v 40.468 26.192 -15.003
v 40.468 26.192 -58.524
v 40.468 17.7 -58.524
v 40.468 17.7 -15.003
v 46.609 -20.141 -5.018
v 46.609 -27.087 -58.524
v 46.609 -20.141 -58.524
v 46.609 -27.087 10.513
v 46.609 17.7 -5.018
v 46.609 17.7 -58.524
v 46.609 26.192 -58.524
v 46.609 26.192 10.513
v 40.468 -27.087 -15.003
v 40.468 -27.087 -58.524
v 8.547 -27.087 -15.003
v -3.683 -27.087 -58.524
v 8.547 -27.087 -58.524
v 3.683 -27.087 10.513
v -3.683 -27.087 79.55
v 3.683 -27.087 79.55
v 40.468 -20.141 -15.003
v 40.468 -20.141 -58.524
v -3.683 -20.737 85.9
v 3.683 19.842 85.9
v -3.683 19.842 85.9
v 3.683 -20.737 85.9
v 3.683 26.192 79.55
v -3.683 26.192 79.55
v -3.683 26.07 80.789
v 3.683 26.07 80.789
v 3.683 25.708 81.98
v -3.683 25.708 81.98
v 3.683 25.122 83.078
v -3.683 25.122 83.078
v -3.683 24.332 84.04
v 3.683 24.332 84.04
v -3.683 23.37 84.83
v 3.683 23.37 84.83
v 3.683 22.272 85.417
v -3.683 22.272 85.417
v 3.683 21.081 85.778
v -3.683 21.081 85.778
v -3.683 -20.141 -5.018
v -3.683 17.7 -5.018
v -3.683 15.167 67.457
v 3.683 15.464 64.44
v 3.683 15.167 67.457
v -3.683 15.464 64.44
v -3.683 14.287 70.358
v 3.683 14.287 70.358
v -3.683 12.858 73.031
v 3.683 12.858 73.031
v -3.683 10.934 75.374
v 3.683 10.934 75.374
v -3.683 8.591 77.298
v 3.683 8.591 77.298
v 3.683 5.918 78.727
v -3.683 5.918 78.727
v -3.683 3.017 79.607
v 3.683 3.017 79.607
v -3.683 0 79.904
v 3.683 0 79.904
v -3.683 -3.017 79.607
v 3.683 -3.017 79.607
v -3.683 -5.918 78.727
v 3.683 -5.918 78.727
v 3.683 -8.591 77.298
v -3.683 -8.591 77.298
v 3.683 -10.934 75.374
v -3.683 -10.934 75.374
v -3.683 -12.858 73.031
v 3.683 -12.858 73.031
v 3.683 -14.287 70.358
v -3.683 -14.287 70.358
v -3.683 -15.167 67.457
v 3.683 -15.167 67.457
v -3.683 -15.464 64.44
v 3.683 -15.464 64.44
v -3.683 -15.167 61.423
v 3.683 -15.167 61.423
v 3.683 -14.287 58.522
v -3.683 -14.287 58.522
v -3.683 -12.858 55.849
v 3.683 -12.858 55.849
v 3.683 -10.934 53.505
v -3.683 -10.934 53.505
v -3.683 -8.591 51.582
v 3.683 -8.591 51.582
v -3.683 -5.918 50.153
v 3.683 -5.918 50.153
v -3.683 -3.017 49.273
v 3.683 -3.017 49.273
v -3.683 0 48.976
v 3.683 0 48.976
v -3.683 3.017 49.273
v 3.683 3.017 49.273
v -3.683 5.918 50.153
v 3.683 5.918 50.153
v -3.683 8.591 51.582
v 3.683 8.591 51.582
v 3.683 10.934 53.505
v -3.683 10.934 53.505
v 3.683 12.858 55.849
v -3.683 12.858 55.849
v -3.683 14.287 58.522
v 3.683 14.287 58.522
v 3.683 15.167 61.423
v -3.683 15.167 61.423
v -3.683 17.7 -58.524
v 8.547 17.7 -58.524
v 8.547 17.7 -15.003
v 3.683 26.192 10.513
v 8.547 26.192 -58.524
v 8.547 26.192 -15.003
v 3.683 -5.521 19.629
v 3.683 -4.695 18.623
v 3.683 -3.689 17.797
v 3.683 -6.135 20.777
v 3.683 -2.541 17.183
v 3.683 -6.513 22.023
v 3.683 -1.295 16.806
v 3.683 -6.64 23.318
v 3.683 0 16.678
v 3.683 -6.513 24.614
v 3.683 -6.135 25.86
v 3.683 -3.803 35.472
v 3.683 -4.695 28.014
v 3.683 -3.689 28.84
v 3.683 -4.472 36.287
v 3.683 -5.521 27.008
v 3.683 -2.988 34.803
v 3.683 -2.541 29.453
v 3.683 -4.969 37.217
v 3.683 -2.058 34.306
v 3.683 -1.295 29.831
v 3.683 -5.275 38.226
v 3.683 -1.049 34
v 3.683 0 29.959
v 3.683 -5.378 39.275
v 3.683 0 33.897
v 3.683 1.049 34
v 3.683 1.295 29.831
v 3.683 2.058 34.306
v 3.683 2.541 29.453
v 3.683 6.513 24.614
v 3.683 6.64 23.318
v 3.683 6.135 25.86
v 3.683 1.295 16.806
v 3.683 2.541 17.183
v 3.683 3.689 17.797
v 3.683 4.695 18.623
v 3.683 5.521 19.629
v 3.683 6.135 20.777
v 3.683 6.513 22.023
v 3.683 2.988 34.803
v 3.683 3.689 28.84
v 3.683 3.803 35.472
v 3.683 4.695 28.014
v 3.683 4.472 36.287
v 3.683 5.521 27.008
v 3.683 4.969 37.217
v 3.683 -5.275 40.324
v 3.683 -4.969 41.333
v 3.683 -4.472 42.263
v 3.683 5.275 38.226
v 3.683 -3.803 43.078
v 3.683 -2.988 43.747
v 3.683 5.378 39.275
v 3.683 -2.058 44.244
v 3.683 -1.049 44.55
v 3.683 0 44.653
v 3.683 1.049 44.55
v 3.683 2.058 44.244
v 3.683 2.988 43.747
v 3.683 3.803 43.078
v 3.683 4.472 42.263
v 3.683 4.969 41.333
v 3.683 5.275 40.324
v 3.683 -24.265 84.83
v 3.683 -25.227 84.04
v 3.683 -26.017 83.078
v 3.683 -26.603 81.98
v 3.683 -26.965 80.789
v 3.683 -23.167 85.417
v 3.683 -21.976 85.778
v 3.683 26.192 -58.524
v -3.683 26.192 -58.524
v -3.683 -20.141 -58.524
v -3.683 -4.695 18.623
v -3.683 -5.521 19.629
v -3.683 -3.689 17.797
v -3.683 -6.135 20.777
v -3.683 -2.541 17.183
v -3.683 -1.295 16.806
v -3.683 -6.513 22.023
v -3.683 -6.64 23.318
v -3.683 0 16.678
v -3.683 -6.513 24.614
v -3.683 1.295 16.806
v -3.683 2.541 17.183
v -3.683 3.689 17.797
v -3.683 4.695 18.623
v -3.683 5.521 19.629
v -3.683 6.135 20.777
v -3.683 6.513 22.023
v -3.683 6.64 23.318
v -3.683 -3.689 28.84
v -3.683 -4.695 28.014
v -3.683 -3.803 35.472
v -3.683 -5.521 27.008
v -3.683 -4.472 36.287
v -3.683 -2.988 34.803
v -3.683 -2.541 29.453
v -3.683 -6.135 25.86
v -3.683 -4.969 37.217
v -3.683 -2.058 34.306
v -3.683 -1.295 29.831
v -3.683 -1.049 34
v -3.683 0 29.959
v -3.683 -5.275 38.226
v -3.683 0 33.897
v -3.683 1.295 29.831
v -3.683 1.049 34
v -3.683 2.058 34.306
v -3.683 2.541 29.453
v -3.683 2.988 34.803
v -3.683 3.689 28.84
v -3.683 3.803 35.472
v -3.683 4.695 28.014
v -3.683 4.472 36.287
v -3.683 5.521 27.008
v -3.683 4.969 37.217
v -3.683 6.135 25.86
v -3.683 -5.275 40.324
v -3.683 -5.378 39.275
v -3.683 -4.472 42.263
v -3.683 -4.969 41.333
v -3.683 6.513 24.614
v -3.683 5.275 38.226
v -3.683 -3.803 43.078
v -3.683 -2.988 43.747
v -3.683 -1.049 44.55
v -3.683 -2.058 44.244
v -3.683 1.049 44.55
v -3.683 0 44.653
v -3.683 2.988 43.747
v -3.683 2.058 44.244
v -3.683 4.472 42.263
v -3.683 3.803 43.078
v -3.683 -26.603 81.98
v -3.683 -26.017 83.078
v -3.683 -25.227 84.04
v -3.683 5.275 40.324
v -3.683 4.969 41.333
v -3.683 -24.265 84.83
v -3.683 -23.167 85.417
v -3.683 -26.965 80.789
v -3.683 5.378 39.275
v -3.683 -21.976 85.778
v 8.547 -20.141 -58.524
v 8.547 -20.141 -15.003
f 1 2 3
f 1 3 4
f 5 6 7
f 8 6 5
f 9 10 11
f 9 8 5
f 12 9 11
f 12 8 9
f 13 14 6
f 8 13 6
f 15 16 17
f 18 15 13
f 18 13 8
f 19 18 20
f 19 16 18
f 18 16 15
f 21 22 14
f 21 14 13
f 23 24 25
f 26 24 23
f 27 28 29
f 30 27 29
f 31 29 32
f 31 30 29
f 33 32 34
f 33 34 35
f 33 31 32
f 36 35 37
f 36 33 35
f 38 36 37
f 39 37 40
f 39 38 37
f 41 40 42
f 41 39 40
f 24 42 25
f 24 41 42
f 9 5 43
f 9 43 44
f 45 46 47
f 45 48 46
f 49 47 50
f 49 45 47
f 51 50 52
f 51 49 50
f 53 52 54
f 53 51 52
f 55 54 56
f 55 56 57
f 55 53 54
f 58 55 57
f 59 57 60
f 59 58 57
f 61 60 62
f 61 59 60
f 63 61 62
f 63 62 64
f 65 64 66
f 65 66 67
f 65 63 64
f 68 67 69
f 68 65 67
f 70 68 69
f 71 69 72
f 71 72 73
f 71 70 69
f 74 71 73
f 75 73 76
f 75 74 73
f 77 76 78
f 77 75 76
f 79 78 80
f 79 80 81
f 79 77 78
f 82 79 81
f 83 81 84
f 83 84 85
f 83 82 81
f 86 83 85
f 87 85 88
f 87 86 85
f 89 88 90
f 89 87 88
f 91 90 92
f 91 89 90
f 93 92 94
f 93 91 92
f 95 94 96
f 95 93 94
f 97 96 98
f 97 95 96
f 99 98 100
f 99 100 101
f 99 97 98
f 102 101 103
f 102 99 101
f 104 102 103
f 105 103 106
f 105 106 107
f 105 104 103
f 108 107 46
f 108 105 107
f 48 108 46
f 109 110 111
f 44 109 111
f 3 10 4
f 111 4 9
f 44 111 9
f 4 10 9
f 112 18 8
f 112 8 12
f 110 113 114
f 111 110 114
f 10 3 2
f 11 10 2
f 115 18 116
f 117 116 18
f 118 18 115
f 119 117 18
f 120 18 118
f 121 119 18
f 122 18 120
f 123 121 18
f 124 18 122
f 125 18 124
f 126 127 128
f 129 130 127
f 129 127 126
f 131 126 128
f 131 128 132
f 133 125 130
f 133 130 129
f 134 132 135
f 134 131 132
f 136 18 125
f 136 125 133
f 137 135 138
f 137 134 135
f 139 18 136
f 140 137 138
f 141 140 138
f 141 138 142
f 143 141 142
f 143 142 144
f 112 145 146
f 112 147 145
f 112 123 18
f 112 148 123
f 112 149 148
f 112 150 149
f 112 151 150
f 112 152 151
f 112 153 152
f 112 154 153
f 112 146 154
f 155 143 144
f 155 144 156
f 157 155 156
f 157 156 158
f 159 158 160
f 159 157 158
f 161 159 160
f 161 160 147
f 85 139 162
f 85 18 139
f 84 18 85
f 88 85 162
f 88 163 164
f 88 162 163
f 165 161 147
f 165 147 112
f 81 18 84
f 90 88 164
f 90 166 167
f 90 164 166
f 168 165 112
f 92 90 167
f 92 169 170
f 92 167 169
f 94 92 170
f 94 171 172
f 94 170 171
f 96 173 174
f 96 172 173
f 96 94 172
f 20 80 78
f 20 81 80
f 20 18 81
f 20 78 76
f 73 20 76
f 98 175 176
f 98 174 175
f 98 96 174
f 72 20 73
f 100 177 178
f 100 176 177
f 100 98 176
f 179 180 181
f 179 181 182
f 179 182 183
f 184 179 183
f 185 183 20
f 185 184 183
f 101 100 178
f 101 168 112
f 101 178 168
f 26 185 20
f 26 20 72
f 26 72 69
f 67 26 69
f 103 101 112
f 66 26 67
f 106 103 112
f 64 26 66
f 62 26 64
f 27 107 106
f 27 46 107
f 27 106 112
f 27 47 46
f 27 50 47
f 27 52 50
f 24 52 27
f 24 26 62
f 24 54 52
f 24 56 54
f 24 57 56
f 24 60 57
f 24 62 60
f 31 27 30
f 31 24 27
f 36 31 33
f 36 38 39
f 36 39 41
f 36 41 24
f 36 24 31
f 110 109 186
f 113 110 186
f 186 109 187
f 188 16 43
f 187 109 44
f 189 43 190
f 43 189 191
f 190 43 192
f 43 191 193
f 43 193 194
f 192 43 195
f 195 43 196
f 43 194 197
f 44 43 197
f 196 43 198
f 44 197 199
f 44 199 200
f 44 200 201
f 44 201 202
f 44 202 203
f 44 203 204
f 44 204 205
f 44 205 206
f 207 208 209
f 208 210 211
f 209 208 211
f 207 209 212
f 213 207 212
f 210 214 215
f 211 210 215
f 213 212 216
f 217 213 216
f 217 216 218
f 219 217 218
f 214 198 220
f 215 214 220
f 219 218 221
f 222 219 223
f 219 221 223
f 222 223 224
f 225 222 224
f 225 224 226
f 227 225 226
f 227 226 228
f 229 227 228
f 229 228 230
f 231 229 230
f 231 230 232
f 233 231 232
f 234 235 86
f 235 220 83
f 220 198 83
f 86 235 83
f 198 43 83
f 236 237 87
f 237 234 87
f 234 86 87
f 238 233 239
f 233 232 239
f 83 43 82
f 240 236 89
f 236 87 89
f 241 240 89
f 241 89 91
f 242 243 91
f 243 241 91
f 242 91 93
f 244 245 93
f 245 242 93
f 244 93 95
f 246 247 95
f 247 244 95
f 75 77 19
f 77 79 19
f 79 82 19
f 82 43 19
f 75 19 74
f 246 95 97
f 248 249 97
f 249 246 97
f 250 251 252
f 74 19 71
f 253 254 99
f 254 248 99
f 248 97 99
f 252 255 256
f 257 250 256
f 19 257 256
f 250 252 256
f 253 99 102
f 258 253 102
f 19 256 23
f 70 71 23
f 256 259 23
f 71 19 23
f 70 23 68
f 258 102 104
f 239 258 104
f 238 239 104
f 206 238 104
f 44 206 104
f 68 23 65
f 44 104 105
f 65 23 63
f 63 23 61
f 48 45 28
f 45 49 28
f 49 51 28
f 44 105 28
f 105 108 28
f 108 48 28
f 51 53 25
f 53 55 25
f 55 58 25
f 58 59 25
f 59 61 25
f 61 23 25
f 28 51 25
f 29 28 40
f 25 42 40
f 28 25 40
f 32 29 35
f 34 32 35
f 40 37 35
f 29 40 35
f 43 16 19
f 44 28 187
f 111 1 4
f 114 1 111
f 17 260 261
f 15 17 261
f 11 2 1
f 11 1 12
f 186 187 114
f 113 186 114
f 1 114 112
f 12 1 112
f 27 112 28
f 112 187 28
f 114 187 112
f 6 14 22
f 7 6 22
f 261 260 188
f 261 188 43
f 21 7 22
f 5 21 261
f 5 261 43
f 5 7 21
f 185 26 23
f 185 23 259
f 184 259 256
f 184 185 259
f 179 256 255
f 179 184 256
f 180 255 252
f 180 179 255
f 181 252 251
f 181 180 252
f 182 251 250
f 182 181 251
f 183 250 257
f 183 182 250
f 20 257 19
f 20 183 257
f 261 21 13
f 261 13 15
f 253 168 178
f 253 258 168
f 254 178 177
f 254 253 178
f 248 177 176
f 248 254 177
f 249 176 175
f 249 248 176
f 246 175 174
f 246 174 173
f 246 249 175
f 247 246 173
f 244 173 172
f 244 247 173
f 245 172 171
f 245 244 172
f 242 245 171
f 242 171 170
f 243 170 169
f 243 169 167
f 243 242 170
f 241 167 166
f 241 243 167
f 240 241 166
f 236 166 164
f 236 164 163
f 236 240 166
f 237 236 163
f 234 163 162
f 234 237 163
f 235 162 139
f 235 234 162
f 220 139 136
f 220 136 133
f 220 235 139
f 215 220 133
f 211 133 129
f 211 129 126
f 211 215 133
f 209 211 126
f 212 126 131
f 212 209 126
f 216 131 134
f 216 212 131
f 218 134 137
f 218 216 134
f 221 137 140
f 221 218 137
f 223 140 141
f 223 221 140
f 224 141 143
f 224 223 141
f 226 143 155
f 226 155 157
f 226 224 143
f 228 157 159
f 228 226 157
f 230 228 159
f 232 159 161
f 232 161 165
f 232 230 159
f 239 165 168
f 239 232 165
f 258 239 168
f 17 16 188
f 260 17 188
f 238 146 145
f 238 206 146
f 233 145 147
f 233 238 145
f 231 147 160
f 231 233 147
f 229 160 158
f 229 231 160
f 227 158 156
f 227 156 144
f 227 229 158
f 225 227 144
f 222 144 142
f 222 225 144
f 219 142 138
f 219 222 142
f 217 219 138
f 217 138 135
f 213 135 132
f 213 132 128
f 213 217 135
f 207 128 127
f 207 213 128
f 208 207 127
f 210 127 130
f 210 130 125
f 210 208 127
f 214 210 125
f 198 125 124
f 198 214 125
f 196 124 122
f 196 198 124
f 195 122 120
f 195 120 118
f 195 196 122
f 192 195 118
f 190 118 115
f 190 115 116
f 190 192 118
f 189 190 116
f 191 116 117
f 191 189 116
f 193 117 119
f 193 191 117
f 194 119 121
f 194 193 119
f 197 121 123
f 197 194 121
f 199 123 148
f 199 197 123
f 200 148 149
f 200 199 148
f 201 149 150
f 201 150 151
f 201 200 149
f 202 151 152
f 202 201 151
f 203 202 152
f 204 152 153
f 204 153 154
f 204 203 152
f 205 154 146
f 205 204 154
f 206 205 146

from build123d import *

# Parameters (mm, degrees)
F0_R     = 6.6404165098
F0_R_2   = 5.3780790225
F0_R_3   = 15.463703615
F1_DEPTH = 3.683
F2_W     = 53.2784113497
F2_H     = 69.0371559083
F3_DEPTH = 42.926
F4_W     = 37.8411058336
F4_H     = 53.5067310557
F5_DEPTH = 50.293
F6_W     = 31.9212079048
F6_H     = 43.5216361657
F7_DEPTH = 53.2794113497


# Not quite as in the source:
# - a feature names something its author has since deleted; it is built from what else it names


with BuildPart() as f1:
    # F0 (on Right) → F1 (new body, symmetric)
    with BuildSketch(Plane.YZ):
        with BuildLine():
            Line((19.8416914791, 85.8998820186), (-20.7367198706, 85.8998820186))
            ThreePointArc((-20.7367198706, 85.8998820186), (-25.2268479311, 84.0400100791), (-27.0867198706, 79.5498820186))
            Line((-27.0867198706, 79.5498820186), (-27.0867198706, -58.5244297981))
            Line((-27.0867198706, -58.5244297981), (26.1916914791, -58.5244297981))
            Line((26.1916914791, -58.5244297981), (26.1916914791, 79.5498820186))
            ThreePointArc((26.1916914791, 79.5498820186), (24.3318195396, 84.0400100791), (19.8416914791, 85.8998820186))
        make_face()
        with Locations((0, 23.3183521777)):
            Circle(F0_R, mode=Mode.SUBTRACT)
        with Locations((0, 39.2750576138)):
            Circle(F0_R_2, mode=Mode.SUBTRACT)
        with Locations((0, 64.4399300218)):
            Circle(F0_R_3, mode=Mode.SUBTRACT)
    extrude(amount=F1_DEPTH, both=True)

    # F2 (on face) → F3 (join)
    with BuildSketch(Plane.YZ.offset(3.683)):
        with Locations((-0.4475141957, -24.005851844)):
            Rectangle(F2_W, F2_H)
    extrude(amount=F3_DEPTH)

    # F4 (on face) → F5 (cut, through all)
    with BuildSketch(Plane.YZ.offset(46.609)):
        with Locations((-1.2208549306, -31.7710642703)):
            Rectangle(F4_W, F4_H)
    extrude(amount=-F5_DEPTH, mode=Mode.SUBTRACT)

    # F6 (on face) → F7 (cut, through all)
    with BuildSketch(Plane(origin=(0, 26.1916914791, 0), x_dir=(-1, 0, 0), z_dir=(0, 1, 0))):
        with Locations((-24.5076268911, -36.7636117153)):
            Rectangle(F6_W, F6_H)
    extrude(amount=-F7_DEPTH, mode=Mode.SUBTRACT)


solid = f1.part
